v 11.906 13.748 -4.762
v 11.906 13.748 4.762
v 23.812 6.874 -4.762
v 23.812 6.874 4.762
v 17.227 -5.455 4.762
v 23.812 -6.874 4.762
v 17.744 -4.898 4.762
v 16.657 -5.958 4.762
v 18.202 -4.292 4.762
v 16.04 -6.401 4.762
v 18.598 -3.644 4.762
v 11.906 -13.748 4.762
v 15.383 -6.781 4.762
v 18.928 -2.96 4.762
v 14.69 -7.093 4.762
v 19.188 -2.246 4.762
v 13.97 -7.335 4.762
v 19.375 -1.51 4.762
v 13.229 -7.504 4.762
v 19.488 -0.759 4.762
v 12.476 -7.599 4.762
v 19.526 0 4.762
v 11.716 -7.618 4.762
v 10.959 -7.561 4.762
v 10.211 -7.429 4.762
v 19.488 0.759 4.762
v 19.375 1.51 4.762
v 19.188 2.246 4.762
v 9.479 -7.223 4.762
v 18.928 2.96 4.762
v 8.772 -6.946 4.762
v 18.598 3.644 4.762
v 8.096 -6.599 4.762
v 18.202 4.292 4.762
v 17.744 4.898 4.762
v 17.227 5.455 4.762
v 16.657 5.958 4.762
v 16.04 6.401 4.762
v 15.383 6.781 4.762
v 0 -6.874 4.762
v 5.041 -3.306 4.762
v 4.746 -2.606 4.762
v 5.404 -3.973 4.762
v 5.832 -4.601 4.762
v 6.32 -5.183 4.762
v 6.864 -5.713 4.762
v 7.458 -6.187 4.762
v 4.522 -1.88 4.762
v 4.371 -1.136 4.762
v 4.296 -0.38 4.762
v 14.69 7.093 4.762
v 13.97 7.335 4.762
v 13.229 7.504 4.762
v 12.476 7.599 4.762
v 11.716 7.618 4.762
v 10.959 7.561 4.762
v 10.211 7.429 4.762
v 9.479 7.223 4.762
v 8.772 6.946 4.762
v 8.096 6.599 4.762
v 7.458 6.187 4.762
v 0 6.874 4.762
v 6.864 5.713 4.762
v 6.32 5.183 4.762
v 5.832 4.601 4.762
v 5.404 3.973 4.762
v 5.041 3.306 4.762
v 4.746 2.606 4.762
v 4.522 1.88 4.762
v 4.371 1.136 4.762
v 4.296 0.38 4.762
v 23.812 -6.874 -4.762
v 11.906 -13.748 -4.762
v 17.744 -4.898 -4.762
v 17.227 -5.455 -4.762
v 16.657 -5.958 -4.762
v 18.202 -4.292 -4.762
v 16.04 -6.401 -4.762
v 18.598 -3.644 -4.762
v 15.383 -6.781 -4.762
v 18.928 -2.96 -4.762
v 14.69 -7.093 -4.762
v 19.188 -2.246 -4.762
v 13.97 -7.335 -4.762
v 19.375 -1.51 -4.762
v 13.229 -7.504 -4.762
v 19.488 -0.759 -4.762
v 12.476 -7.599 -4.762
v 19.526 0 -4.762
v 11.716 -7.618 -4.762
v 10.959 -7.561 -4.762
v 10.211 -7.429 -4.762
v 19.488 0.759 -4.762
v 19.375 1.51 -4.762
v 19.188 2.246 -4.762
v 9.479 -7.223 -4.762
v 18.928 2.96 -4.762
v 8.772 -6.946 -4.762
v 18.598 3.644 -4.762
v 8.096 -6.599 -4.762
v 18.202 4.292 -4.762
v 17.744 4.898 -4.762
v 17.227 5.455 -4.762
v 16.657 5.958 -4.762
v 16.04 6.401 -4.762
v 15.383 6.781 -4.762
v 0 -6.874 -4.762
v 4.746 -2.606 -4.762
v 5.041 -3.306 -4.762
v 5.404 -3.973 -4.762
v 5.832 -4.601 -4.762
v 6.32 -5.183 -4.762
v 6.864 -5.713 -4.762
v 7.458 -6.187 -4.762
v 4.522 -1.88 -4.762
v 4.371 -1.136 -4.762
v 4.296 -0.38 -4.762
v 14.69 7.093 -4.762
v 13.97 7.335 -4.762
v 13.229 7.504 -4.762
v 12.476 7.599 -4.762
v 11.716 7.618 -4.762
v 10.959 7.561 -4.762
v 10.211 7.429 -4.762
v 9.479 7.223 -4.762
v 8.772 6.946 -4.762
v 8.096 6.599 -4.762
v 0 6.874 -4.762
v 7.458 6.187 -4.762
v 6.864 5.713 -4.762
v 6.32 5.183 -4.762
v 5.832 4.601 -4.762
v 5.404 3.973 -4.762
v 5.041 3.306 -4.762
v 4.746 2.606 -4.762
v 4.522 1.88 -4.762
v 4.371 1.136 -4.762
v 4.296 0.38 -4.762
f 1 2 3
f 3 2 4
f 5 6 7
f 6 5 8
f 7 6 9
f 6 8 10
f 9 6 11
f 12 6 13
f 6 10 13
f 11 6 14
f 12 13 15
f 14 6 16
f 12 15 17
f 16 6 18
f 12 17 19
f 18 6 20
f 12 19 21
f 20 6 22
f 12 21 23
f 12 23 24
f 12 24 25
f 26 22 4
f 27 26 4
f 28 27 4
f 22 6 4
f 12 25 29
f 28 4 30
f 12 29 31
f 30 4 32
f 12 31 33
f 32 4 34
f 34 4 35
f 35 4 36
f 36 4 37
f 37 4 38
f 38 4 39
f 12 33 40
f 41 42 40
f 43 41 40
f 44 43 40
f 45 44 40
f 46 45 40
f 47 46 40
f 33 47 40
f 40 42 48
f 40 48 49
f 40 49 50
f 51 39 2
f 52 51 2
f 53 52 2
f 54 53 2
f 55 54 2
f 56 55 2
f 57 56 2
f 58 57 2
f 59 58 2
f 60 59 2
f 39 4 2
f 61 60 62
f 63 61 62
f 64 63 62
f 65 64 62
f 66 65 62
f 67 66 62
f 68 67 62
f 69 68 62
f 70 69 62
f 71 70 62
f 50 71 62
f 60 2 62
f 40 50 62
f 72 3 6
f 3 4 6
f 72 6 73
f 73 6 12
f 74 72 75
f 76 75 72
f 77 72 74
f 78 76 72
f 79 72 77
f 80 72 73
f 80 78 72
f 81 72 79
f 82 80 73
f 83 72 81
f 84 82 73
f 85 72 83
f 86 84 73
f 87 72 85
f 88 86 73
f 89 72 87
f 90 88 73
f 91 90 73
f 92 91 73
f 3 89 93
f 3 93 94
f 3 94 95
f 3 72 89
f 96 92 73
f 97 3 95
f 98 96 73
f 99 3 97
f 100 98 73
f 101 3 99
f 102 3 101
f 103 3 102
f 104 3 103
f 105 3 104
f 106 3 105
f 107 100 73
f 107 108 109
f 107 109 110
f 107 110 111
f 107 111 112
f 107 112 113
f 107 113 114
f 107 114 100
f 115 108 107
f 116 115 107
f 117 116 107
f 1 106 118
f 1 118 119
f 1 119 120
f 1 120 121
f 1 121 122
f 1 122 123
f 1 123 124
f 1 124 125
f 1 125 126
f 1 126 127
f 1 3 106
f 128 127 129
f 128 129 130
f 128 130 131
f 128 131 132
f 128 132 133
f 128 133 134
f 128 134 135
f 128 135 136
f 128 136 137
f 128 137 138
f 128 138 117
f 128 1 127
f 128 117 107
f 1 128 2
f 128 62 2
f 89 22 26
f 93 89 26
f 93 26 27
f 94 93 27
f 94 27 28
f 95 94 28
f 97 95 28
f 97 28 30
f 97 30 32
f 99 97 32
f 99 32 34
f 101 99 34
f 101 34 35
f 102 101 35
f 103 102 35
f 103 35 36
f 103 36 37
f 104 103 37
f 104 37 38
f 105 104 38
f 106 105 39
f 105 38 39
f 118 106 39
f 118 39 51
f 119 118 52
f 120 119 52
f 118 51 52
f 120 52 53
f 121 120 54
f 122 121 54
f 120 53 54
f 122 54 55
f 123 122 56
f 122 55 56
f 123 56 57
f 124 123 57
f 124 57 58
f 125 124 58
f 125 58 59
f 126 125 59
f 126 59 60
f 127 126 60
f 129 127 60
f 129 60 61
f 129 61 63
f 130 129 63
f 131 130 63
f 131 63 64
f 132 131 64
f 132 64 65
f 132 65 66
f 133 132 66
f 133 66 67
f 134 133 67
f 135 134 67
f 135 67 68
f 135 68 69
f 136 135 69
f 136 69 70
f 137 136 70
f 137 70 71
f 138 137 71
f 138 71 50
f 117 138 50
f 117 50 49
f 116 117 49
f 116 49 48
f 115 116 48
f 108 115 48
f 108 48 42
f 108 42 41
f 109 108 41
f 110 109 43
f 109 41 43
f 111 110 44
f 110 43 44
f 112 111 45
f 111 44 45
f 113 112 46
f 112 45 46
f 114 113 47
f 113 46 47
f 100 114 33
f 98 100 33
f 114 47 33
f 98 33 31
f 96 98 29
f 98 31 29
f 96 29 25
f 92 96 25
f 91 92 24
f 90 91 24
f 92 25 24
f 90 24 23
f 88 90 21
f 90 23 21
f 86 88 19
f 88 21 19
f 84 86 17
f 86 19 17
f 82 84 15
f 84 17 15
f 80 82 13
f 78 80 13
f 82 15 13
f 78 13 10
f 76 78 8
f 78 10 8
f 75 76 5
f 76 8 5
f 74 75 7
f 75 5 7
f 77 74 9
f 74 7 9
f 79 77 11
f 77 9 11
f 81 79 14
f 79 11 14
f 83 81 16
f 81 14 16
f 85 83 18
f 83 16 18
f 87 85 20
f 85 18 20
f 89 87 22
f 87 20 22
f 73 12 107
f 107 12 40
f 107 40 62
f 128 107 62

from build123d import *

# Parameters (mm, degrees)
BOSS_EXTRUDE1_DEPTH = 4.7625
SKETCH2_R           = 7.62
CUT_EXTRUDE1_DEPTH  = 30.099355663


with BuildPart() as part:
    # Sketch1 → Boss-Extrude1 (new, symmetric)
    with BuildSketch(Plane.XY):
        Polygon((0, -6.874076643), (0, 6.874076643), (11.90625, 13.748153285), (23.8125, 6.874076643), (23.8125, -6.874076643), (11.90625, -13.748153285), align=None)
    extrude(amount=BOSS_EXTRUDE1_DEPTH, both=True)

    # Sketch2 → Cut-Extrude1 (cut, through all)
    with BuildSketch(Plane.XY.offset(4.7625)):
        with Locations((11.90625, 0)):
            Circle(SKETCH2_R)
    extrude(amount=-CUT_EXTRUDE1_DEPTH, mode=Mode.SUBTRACT)


solid = part.part
